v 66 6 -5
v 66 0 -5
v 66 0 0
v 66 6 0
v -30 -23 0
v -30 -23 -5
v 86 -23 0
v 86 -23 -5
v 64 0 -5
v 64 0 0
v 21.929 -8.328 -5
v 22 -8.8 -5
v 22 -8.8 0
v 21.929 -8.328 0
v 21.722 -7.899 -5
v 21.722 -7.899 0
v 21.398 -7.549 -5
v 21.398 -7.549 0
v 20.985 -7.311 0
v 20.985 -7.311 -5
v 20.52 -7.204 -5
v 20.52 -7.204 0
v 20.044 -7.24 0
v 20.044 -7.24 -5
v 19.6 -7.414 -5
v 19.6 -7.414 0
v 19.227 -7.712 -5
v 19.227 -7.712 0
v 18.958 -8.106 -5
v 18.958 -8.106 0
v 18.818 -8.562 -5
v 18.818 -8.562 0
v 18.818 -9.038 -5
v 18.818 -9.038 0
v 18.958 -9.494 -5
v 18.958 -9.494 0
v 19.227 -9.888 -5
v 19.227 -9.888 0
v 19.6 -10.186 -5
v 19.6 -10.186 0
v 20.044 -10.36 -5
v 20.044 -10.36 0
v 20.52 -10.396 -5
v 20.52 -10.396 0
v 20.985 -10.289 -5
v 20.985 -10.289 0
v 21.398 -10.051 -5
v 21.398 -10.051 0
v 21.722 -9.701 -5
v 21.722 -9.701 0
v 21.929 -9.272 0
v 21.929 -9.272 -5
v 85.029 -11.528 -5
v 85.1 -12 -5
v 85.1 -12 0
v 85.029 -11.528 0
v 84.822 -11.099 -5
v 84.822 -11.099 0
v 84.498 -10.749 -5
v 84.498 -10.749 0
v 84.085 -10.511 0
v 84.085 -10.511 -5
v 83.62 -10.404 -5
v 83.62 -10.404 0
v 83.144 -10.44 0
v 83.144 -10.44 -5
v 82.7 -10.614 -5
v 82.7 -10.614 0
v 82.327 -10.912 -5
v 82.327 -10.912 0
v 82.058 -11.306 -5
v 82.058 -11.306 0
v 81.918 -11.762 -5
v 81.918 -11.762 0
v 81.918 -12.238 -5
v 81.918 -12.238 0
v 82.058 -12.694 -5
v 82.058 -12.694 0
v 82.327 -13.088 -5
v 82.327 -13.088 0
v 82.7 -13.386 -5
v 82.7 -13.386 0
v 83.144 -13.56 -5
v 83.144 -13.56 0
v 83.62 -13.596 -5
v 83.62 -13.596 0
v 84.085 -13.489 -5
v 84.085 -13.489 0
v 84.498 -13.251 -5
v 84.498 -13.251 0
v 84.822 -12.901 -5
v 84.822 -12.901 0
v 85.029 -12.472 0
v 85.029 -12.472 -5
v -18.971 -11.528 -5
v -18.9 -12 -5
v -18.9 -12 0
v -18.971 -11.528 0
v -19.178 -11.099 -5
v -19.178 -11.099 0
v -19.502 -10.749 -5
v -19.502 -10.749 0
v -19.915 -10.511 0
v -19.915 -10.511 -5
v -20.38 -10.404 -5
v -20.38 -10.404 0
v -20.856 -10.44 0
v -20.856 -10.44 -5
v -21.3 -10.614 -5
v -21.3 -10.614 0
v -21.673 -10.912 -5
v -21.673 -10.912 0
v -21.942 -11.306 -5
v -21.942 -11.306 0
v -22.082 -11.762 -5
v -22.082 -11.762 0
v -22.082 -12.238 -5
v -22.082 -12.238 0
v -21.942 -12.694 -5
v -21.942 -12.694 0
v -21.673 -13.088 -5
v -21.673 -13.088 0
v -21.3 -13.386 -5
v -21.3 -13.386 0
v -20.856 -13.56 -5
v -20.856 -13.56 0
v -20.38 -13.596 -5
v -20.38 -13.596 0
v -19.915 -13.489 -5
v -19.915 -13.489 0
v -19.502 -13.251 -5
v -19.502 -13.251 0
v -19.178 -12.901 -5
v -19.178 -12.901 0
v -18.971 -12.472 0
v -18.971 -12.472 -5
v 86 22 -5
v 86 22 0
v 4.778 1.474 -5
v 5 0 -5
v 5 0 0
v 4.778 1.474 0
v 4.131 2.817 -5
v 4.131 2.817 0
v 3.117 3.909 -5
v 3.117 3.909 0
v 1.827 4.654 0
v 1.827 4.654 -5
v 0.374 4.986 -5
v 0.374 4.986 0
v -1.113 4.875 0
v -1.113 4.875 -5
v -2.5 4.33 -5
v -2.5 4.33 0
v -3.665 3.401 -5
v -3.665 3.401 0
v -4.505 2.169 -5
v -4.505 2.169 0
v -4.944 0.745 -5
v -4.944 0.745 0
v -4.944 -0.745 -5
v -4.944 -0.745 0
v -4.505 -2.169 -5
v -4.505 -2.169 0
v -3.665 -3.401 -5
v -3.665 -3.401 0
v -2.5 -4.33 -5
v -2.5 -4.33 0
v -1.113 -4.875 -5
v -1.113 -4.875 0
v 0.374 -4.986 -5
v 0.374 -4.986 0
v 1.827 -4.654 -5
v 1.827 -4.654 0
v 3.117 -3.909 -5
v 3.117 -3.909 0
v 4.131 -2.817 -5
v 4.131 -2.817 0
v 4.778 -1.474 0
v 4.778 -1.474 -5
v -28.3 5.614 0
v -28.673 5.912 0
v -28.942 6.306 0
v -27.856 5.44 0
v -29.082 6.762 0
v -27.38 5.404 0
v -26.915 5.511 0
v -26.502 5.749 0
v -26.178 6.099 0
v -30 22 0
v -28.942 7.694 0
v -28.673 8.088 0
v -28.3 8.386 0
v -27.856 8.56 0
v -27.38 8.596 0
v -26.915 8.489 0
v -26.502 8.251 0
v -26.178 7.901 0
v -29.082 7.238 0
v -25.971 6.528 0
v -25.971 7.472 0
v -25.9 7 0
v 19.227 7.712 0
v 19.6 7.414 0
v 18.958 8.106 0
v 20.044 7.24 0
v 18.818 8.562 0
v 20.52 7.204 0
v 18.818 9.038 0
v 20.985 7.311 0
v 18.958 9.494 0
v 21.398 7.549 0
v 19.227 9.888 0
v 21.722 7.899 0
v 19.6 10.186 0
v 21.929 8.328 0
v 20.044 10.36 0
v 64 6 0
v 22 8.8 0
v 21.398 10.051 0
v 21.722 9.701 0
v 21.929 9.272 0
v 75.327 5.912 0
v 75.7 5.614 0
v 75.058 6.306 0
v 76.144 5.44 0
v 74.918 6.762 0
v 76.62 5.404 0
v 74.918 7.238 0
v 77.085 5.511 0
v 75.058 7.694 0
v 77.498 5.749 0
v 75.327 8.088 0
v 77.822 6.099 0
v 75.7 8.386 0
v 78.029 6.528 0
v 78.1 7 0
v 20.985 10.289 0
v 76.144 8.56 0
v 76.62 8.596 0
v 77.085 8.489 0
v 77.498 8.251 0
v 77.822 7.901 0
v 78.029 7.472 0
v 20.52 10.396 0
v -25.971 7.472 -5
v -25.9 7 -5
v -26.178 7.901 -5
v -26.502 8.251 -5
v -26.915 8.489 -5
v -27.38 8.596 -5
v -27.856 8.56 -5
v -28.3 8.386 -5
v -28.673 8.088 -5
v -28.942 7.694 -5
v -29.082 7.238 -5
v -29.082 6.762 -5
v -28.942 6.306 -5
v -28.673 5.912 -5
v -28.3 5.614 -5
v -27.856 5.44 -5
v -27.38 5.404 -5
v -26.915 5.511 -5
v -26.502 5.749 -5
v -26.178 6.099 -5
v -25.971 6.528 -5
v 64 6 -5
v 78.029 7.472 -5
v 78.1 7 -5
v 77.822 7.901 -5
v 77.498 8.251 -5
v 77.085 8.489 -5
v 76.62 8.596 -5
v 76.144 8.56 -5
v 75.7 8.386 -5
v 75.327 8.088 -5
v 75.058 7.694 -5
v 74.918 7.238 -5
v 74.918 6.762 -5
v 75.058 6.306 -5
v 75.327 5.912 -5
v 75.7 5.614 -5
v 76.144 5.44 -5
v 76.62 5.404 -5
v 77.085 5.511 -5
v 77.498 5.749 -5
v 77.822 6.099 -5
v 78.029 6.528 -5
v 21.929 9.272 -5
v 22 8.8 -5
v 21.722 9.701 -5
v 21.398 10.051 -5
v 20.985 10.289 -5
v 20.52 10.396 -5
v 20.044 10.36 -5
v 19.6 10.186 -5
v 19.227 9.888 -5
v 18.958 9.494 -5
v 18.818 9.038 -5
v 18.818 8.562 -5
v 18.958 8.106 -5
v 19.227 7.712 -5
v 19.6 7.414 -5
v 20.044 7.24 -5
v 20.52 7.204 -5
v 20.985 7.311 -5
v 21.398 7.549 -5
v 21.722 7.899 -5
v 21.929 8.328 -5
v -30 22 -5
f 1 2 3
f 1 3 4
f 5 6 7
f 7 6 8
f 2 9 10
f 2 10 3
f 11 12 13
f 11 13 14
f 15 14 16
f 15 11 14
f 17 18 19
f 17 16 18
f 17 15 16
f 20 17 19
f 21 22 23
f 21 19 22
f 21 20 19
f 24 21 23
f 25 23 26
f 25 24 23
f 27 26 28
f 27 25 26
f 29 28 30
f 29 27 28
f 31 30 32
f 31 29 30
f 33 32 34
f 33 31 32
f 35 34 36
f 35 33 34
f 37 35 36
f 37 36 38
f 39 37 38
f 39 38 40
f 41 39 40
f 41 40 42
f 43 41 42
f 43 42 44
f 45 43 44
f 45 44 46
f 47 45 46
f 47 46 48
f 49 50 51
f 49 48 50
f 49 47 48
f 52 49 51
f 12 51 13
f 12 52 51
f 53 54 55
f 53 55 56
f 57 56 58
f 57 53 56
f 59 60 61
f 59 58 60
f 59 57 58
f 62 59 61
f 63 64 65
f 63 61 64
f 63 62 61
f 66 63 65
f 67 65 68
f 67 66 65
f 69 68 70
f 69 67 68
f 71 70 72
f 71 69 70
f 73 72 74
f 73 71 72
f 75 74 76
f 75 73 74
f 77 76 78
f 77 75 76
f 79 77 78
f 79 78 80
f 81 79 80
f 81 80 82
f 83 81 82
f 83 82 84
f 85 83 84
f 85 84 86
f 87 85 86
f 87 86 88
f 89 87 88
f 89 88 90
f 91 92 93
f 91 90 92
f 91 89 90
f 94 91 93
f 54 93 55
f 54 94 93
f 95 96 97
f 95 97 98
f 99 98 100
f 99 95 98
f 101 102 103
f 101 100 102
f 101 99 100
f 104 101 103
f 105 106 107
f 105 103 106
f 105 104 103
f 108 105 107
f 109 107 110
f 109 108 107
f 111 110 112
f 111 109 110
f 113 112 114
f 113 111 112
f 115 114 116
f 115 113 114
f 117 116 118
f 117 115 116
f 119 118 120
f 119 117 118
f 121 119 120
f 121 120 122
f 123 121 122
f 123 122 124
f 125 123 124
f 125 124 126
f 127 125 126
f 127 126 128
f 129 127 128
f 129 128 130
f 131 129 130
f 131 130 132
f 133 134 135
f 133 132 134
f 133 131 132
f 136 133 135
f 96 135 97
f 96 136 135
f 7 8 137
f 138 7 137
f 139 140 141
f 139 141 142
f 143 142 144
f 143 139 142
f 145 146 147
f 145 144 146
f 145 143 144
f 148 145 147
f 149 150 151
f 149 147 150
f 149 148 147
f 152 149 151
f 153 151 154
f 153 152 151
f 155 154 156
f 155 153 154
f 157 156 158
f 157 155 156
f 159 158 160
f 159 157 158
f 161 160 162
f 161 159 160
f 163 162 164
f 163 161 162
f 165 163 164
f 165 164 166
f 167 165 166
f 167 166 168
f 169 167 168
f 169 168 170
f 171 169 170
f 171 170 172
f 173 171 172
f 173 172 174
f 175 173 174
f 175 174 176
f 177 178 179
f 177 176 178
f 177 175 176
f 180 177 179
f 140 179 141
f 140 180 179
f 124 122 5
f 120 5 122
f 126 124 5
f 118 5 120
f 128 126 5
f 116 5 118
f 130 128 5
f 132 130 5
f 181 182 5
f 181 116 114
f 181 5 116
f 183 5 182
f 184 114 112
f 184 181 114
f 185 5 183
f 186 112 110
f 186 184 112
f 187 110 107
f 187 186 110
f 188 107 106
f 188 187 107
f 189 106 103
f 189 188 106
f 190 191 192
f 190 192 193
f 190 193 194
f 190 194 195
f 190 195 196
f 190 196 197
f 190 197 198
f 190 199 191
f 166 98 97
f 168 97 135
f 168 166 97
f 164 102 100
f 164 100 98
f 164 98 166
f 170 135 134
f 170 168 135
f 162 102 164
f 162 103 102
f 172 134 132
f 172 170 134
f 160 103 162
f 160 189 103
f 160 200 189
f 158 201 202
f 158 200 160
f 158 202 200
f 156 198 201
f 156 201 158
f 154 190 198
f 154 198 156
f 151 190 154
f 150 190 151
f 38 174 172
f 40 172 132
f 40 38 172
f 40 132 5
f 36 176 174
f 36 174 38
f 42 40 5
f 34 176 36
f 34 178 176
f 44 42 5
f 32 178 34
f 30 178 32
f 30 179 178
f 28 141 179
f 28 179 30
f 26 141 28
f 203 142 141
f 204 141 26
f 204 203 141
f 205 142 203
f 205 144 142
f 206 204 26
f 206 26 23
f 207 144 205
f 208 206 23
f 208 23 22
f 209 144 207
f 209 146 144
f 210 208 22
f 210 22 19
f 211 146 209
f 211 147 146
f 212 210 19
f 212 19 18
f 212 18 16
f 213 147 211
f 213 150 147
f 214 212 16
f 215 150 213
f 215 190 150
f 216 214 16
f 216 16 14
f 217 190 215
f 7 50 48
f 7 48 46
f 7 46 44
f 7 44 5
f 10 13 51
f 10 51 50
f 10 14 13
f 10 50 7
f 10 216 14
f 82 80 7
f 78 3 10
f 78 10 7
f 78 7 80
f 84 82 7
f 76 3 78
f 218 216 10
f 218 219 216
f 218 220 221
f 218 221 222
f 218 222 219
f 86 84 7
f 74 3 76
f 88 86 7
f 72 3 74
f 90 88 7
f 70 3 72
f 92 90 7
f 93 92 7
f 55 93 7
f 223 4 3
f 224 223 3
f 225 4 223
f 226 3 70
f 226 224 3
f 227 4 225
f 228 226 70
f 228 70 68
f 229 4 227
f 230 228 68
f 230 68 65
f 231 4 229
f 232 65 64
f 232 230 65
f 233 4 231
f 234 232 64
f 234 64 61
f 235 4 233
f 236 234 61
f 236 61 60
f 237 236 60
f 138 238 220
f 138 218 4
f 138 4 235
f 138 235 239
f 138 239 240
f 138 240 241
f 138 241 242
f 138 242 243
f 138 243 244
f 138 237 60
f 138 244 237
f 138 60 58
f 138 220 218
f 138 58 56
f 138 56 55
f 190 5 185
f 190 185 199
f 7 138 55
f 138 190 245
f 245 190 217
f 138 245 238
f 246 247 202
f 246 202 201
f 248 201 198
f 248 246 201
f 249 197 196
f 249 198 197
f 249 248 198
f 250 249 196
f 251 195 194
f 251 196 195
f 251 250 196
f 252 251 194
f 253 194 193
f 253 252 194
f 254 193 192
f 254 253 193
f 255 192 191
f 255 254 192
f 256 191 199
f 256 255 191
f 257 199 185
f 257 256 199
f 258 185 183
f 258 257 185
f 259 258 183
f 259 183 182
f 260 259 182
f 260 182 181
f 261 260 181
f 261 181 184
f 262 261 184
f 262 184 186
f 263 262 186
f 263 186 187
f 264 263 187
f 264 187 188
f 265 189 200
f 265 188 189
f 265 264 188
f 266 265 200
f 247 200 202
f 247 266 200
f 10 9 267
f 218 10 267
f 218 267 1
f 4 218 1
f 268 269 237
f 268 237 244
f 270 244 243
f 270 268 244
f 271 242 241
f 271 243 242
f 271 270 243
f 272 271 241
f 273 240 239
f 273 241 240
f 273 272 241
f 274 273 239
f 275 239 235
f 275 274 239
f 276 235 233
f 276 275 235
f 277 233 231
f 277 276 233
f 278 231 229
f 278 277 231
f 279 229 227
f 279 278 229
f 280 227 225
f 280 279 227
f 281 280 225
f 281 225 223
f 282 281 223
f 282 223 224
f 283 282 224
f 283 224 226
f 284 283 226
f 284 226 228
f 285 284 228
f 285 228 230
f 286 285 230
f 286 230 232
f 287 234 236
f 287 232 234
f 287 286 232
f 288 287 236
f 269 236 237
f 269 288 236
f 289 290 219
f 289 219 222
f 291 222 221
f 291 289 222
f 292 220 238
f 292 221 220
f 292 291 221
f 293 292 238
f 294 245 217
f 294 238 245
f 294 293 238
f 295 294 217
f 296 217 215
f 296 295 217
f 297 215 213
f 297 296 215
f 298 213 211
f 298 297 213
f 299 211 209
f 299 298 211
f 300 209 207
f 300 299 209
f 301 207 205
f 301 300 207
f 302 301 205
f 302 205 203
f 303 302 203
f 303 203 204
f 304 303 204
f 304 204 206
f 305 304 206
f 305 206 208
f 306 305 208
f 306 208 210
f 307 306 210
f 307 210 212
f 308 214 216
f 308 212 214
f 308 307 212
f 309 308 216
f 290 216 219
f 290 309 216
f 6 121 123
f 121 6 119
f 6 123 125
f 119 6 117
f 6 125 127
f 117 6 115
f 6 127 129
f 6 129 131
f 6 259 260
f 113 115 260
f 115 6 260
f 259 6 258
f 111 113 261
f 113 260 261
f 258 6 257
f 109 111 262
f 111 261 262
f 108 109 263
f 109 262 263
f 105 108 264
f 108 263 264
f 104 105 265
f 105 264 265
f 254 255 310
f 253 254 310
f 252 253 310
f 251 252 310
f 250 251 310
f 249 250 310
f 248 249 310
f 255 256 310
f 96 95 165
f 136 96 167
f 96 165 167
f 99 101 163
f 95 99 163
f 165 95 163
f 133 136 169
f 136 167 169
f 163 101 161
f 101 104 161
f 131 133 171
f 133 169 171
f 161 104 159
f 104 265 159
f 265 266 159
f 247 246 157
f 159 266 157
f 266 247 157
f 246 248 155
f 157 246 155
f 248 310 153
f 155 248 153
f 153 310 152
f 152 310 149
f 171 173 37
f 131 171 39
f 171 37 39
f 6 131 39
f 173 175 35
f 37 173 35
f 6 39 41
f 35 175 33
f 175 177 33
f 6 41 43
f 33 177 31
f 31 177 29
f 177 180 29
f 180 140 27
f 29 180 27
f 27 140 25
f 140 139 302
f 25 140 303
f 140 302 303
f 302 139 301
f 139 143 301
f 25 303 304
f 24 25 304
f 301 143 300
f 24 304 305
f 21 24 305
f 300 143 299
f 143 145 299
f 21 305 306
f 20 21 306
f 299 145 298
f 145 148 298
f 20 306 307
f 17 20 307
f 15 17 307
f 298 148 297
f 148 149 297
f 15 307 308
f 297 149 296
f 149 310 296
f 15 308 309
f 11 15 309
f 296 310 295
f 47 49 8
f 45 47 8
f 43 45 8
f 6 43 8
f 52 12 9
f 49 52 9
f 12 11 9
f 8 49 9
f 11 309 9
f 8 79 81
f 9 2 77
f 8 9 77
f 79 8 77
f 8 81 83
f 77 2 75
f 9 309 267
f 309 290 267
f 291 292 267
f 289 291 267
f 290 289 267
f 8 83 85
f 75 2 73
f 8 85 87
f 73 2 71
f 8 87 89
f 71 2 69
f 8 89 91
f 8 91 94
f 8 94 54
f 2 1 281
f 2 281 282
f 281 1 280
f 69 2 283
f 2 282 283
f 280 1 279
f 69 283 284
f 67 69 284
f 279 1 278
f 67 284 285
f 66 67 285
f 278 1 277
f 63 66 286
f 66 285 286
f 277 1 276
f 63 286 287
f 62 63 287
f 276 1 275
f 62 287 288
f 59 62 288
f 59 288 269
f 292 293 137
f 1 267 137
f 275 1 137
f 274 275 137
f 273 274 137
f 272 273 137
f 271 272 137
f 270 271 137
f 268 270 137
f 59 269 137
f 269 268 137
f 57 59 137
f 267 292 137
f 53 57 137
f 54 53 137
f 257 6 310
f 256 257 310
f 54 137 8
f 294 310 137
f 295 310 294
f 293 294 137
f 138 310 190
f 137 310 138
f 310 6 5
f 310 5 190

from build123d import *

# Parameters (mm, degrees)
BOX036_W                = 2
BOX036_H                = 6
BOX036_DEPTH            = 10
CYLINDER030_R           = 1.6
CYLINDER030_DEPTH       = 50
CYLINDER029_R           = 5
CYLINDER029_DEPTH       = 22.5
CYLINDER031_R           = 1.6
CYLINDER031_DEPTH       = 50
CYLINDER019_R           = 1.6
CYLINDER019_DEPTH       = 40
CYLINDER019_PITCH_ANGLE = 90
CYLINDER018_R           = 1.6
CYLINDER018_DEPTH       = 40
CYLINDER018_PITCH_ANGLE = 90
CYLINDER017_R           = 1.6
CYLINDER017_DEPTH       = 40
CYLINDER016_R           = 1.6
CYLINDER016_DEPTH       = 70
CYLINDER016_ROLL_ANGLE  = 90
CYLINDER015_R           = 1.6
CYLINDER015_DEPTH       = 40
BOX012_W                = 116
BOX012_H                = 45
BOX012_DEPTH            = 5


with BuildPart() as cube024:
    # Box036 → Box036 (new body)
    with BuildSketch(Plane(origin=(64, 0, -8), x_dir=(1, 0, 0), z_dir=(0, 0, 1))):
        with Locations((1, 3)):
            Rectangle(BOX036_W, BOX036_H)
    extrude(amount=BOX036_DEPTH)


with BuildPart() as cylinder030:
    # Cylinder030 → Cylinder030 (new body)
    with BuildSketch(Plane(origin=(20.4, 8.8, -22), x_dir=(1, 0, 0), z_dir=(0, 0, 1))):
        Circle(CYLINDER030_R)
    extrude(amount=CYLINDER030_DEPTH)


with BuildPart() as fusion034:
    # Cylinder029 → Cylinder029 (new body)
    with BuildSketch(Plane.XY.offset(-12)):
        Circle(CYLINDER029_R)
    extrude(amount=CYLINDER029_DEPTH)

    # Fusion034: union Cylinder030
    add(cylinder030.part)


with BuildPart() as motor_holes_z:
    # Cylinder031 → Cylinder031 (new body)
    with BuildSketch(Plane(origin=(20.4, -8.8, -22), x_dir=(1, 0, 0), z_dir=(0, 0, 1))):
        Circle(CYLINDER031_R)
    extrude(amount=CYLINDER031_DEPTH)

    # Fusion035: union Fusion034
    add(fusion034.part)


with BuildPart() as cylinder100:
    # Cylinder019 → Cylinder019 (new body)
    with BuildSketch(Plane.XY):
        Circle(CYLINDER019_R)
    extrude(amount=CYLINDER019_DEPTH)


with BuildPart() as cylinder100_1:
    # Cylinder019 pitch: moved
    add(cylinder100.part.rotate(Axis((0, 0, 0), (0, 1, 0)), CYLINDER019_PITCH_ANGLE))


with BuildPart() as cylinder100_2:
    # Cylinder019 placement: moved
    add(cylinder100_1.part.moved(Location((-40, 12, 9.5))))


with BuildPart() as fusion011:
    # Cylinder018 → Cylinder018 (new body)
    with BuildSketch(Plane.XY):
        Circle(CYLINDER018_R)
    extrude(amount=CYLINDER018_DEPTH)


with BuildPart() as fusion011_1:
    # Cylinder018 pitch: moved
    add(fusion011.part.rotate(Axis((0, 0, 0), (0, 1, 0)), CYLINDER018_PITCH_ANGLE))


with BuildPart() as fusion011_2:
    # Cylinder018 placement: moved
    add(fusion011_1.part.moved(Location((-40, -7, 2.5))))

    # Fusion011: union Cylinder100
    add(cylinder100_2.part)


with BuildPart() as fusion012:
    # Cylinder017 → Cylinder017 (new body)
    with BuildSketch(Plane(origin=(-27.5, 7, -15), x_dir=(1, 0, 0), z_dir=(0, 0, 1))):
        Circle(CYLINDER017_R)
    extrude(amount=CYLINDER017_DEPTH)

    # Fusion012: union Fusion011
    add(fusion011_2.part)


with BuildPart() as fusion013:
    # Cylinder016 → Cylinder016 (new body)
    with BuildSketch(Plane.XY):
        Circle(CYLINDER016_R)
    extrude(amount=CYLINDER016_DEPTH)


with BuildPart() as fusion013_1:
    # Cylinder016 roll: moved
    add(fusion013.part.rotate(Axis((0, 0, 0), (1, 0, 0)), CYLINDER016_ROLL_ANGLE))


with BuildPart() as fusion013_2:
    # Cylinder016 placement: moved
    add(fusion013_1.part.moved(Location((-24, 39, 6))))

    # Fusion013: union Fusion012
    add(fusion012.part)


with BuildPart() as cylinder008:
    # Cylinder015 → Cylinder015 (new body)
    with BuildSketch(Plane(origin=(-20.5, -12, -15), x_dir=(1, 0, 0), z_dir=(0, 0, 1))):
        Circle(CYLINDER015_R)
    extrude(amount=CYLINDER015_DEPTH)


with BuildPart() as face_corner_holes008:
    # Fusion022 base: copy of Cylinder008
    add(cylinder008.part)

    # Fusion022: union Fusion013
    add(fusion013_2.part)


with BuildPart() as face_corner_holes008_1:
    # Fusion022 placement: moved
    add(face_corner_holes008.part.moved(Location((104, 0, 0))))


with BuildPart() as face_corner_holes005:
    # Fusion019 base: copy of Cylinder008
    add(cylinder008.part)

    # Fusion019: union Fusion013
    add(fusion013_2.part)


with BuildPart() as left_a:
    # Box012 → Box012 (new body)
    with BuildSketch(Plane(origin=(-30, -23, -5), x_dir=(1, 0, 0), z_dir=(0, 0, 1))):
        with Locations((58, 22.5)):
            Rectangle(BOX012_W, BOX012_H)
    extrude(amount=BOX012_DEPTH)

    # Cut014: cut face-corner-holes005
    add(face_corner_holes005.part, mode=Mode.SUBTRACT)

    # Cut018: cut face-corner-holes008
    add(face_corner_holes008_1.part, mode=Mode.SUBTRACT)

    # Cut029: cut motor-holes-z
    add(motor_holes_z.part, mode=Mode.SUBTRACT)

    # Cut061: cut Cube024
    add(cube024.part, mode=Mode.SUBTRACT)


solid = left_a.part
